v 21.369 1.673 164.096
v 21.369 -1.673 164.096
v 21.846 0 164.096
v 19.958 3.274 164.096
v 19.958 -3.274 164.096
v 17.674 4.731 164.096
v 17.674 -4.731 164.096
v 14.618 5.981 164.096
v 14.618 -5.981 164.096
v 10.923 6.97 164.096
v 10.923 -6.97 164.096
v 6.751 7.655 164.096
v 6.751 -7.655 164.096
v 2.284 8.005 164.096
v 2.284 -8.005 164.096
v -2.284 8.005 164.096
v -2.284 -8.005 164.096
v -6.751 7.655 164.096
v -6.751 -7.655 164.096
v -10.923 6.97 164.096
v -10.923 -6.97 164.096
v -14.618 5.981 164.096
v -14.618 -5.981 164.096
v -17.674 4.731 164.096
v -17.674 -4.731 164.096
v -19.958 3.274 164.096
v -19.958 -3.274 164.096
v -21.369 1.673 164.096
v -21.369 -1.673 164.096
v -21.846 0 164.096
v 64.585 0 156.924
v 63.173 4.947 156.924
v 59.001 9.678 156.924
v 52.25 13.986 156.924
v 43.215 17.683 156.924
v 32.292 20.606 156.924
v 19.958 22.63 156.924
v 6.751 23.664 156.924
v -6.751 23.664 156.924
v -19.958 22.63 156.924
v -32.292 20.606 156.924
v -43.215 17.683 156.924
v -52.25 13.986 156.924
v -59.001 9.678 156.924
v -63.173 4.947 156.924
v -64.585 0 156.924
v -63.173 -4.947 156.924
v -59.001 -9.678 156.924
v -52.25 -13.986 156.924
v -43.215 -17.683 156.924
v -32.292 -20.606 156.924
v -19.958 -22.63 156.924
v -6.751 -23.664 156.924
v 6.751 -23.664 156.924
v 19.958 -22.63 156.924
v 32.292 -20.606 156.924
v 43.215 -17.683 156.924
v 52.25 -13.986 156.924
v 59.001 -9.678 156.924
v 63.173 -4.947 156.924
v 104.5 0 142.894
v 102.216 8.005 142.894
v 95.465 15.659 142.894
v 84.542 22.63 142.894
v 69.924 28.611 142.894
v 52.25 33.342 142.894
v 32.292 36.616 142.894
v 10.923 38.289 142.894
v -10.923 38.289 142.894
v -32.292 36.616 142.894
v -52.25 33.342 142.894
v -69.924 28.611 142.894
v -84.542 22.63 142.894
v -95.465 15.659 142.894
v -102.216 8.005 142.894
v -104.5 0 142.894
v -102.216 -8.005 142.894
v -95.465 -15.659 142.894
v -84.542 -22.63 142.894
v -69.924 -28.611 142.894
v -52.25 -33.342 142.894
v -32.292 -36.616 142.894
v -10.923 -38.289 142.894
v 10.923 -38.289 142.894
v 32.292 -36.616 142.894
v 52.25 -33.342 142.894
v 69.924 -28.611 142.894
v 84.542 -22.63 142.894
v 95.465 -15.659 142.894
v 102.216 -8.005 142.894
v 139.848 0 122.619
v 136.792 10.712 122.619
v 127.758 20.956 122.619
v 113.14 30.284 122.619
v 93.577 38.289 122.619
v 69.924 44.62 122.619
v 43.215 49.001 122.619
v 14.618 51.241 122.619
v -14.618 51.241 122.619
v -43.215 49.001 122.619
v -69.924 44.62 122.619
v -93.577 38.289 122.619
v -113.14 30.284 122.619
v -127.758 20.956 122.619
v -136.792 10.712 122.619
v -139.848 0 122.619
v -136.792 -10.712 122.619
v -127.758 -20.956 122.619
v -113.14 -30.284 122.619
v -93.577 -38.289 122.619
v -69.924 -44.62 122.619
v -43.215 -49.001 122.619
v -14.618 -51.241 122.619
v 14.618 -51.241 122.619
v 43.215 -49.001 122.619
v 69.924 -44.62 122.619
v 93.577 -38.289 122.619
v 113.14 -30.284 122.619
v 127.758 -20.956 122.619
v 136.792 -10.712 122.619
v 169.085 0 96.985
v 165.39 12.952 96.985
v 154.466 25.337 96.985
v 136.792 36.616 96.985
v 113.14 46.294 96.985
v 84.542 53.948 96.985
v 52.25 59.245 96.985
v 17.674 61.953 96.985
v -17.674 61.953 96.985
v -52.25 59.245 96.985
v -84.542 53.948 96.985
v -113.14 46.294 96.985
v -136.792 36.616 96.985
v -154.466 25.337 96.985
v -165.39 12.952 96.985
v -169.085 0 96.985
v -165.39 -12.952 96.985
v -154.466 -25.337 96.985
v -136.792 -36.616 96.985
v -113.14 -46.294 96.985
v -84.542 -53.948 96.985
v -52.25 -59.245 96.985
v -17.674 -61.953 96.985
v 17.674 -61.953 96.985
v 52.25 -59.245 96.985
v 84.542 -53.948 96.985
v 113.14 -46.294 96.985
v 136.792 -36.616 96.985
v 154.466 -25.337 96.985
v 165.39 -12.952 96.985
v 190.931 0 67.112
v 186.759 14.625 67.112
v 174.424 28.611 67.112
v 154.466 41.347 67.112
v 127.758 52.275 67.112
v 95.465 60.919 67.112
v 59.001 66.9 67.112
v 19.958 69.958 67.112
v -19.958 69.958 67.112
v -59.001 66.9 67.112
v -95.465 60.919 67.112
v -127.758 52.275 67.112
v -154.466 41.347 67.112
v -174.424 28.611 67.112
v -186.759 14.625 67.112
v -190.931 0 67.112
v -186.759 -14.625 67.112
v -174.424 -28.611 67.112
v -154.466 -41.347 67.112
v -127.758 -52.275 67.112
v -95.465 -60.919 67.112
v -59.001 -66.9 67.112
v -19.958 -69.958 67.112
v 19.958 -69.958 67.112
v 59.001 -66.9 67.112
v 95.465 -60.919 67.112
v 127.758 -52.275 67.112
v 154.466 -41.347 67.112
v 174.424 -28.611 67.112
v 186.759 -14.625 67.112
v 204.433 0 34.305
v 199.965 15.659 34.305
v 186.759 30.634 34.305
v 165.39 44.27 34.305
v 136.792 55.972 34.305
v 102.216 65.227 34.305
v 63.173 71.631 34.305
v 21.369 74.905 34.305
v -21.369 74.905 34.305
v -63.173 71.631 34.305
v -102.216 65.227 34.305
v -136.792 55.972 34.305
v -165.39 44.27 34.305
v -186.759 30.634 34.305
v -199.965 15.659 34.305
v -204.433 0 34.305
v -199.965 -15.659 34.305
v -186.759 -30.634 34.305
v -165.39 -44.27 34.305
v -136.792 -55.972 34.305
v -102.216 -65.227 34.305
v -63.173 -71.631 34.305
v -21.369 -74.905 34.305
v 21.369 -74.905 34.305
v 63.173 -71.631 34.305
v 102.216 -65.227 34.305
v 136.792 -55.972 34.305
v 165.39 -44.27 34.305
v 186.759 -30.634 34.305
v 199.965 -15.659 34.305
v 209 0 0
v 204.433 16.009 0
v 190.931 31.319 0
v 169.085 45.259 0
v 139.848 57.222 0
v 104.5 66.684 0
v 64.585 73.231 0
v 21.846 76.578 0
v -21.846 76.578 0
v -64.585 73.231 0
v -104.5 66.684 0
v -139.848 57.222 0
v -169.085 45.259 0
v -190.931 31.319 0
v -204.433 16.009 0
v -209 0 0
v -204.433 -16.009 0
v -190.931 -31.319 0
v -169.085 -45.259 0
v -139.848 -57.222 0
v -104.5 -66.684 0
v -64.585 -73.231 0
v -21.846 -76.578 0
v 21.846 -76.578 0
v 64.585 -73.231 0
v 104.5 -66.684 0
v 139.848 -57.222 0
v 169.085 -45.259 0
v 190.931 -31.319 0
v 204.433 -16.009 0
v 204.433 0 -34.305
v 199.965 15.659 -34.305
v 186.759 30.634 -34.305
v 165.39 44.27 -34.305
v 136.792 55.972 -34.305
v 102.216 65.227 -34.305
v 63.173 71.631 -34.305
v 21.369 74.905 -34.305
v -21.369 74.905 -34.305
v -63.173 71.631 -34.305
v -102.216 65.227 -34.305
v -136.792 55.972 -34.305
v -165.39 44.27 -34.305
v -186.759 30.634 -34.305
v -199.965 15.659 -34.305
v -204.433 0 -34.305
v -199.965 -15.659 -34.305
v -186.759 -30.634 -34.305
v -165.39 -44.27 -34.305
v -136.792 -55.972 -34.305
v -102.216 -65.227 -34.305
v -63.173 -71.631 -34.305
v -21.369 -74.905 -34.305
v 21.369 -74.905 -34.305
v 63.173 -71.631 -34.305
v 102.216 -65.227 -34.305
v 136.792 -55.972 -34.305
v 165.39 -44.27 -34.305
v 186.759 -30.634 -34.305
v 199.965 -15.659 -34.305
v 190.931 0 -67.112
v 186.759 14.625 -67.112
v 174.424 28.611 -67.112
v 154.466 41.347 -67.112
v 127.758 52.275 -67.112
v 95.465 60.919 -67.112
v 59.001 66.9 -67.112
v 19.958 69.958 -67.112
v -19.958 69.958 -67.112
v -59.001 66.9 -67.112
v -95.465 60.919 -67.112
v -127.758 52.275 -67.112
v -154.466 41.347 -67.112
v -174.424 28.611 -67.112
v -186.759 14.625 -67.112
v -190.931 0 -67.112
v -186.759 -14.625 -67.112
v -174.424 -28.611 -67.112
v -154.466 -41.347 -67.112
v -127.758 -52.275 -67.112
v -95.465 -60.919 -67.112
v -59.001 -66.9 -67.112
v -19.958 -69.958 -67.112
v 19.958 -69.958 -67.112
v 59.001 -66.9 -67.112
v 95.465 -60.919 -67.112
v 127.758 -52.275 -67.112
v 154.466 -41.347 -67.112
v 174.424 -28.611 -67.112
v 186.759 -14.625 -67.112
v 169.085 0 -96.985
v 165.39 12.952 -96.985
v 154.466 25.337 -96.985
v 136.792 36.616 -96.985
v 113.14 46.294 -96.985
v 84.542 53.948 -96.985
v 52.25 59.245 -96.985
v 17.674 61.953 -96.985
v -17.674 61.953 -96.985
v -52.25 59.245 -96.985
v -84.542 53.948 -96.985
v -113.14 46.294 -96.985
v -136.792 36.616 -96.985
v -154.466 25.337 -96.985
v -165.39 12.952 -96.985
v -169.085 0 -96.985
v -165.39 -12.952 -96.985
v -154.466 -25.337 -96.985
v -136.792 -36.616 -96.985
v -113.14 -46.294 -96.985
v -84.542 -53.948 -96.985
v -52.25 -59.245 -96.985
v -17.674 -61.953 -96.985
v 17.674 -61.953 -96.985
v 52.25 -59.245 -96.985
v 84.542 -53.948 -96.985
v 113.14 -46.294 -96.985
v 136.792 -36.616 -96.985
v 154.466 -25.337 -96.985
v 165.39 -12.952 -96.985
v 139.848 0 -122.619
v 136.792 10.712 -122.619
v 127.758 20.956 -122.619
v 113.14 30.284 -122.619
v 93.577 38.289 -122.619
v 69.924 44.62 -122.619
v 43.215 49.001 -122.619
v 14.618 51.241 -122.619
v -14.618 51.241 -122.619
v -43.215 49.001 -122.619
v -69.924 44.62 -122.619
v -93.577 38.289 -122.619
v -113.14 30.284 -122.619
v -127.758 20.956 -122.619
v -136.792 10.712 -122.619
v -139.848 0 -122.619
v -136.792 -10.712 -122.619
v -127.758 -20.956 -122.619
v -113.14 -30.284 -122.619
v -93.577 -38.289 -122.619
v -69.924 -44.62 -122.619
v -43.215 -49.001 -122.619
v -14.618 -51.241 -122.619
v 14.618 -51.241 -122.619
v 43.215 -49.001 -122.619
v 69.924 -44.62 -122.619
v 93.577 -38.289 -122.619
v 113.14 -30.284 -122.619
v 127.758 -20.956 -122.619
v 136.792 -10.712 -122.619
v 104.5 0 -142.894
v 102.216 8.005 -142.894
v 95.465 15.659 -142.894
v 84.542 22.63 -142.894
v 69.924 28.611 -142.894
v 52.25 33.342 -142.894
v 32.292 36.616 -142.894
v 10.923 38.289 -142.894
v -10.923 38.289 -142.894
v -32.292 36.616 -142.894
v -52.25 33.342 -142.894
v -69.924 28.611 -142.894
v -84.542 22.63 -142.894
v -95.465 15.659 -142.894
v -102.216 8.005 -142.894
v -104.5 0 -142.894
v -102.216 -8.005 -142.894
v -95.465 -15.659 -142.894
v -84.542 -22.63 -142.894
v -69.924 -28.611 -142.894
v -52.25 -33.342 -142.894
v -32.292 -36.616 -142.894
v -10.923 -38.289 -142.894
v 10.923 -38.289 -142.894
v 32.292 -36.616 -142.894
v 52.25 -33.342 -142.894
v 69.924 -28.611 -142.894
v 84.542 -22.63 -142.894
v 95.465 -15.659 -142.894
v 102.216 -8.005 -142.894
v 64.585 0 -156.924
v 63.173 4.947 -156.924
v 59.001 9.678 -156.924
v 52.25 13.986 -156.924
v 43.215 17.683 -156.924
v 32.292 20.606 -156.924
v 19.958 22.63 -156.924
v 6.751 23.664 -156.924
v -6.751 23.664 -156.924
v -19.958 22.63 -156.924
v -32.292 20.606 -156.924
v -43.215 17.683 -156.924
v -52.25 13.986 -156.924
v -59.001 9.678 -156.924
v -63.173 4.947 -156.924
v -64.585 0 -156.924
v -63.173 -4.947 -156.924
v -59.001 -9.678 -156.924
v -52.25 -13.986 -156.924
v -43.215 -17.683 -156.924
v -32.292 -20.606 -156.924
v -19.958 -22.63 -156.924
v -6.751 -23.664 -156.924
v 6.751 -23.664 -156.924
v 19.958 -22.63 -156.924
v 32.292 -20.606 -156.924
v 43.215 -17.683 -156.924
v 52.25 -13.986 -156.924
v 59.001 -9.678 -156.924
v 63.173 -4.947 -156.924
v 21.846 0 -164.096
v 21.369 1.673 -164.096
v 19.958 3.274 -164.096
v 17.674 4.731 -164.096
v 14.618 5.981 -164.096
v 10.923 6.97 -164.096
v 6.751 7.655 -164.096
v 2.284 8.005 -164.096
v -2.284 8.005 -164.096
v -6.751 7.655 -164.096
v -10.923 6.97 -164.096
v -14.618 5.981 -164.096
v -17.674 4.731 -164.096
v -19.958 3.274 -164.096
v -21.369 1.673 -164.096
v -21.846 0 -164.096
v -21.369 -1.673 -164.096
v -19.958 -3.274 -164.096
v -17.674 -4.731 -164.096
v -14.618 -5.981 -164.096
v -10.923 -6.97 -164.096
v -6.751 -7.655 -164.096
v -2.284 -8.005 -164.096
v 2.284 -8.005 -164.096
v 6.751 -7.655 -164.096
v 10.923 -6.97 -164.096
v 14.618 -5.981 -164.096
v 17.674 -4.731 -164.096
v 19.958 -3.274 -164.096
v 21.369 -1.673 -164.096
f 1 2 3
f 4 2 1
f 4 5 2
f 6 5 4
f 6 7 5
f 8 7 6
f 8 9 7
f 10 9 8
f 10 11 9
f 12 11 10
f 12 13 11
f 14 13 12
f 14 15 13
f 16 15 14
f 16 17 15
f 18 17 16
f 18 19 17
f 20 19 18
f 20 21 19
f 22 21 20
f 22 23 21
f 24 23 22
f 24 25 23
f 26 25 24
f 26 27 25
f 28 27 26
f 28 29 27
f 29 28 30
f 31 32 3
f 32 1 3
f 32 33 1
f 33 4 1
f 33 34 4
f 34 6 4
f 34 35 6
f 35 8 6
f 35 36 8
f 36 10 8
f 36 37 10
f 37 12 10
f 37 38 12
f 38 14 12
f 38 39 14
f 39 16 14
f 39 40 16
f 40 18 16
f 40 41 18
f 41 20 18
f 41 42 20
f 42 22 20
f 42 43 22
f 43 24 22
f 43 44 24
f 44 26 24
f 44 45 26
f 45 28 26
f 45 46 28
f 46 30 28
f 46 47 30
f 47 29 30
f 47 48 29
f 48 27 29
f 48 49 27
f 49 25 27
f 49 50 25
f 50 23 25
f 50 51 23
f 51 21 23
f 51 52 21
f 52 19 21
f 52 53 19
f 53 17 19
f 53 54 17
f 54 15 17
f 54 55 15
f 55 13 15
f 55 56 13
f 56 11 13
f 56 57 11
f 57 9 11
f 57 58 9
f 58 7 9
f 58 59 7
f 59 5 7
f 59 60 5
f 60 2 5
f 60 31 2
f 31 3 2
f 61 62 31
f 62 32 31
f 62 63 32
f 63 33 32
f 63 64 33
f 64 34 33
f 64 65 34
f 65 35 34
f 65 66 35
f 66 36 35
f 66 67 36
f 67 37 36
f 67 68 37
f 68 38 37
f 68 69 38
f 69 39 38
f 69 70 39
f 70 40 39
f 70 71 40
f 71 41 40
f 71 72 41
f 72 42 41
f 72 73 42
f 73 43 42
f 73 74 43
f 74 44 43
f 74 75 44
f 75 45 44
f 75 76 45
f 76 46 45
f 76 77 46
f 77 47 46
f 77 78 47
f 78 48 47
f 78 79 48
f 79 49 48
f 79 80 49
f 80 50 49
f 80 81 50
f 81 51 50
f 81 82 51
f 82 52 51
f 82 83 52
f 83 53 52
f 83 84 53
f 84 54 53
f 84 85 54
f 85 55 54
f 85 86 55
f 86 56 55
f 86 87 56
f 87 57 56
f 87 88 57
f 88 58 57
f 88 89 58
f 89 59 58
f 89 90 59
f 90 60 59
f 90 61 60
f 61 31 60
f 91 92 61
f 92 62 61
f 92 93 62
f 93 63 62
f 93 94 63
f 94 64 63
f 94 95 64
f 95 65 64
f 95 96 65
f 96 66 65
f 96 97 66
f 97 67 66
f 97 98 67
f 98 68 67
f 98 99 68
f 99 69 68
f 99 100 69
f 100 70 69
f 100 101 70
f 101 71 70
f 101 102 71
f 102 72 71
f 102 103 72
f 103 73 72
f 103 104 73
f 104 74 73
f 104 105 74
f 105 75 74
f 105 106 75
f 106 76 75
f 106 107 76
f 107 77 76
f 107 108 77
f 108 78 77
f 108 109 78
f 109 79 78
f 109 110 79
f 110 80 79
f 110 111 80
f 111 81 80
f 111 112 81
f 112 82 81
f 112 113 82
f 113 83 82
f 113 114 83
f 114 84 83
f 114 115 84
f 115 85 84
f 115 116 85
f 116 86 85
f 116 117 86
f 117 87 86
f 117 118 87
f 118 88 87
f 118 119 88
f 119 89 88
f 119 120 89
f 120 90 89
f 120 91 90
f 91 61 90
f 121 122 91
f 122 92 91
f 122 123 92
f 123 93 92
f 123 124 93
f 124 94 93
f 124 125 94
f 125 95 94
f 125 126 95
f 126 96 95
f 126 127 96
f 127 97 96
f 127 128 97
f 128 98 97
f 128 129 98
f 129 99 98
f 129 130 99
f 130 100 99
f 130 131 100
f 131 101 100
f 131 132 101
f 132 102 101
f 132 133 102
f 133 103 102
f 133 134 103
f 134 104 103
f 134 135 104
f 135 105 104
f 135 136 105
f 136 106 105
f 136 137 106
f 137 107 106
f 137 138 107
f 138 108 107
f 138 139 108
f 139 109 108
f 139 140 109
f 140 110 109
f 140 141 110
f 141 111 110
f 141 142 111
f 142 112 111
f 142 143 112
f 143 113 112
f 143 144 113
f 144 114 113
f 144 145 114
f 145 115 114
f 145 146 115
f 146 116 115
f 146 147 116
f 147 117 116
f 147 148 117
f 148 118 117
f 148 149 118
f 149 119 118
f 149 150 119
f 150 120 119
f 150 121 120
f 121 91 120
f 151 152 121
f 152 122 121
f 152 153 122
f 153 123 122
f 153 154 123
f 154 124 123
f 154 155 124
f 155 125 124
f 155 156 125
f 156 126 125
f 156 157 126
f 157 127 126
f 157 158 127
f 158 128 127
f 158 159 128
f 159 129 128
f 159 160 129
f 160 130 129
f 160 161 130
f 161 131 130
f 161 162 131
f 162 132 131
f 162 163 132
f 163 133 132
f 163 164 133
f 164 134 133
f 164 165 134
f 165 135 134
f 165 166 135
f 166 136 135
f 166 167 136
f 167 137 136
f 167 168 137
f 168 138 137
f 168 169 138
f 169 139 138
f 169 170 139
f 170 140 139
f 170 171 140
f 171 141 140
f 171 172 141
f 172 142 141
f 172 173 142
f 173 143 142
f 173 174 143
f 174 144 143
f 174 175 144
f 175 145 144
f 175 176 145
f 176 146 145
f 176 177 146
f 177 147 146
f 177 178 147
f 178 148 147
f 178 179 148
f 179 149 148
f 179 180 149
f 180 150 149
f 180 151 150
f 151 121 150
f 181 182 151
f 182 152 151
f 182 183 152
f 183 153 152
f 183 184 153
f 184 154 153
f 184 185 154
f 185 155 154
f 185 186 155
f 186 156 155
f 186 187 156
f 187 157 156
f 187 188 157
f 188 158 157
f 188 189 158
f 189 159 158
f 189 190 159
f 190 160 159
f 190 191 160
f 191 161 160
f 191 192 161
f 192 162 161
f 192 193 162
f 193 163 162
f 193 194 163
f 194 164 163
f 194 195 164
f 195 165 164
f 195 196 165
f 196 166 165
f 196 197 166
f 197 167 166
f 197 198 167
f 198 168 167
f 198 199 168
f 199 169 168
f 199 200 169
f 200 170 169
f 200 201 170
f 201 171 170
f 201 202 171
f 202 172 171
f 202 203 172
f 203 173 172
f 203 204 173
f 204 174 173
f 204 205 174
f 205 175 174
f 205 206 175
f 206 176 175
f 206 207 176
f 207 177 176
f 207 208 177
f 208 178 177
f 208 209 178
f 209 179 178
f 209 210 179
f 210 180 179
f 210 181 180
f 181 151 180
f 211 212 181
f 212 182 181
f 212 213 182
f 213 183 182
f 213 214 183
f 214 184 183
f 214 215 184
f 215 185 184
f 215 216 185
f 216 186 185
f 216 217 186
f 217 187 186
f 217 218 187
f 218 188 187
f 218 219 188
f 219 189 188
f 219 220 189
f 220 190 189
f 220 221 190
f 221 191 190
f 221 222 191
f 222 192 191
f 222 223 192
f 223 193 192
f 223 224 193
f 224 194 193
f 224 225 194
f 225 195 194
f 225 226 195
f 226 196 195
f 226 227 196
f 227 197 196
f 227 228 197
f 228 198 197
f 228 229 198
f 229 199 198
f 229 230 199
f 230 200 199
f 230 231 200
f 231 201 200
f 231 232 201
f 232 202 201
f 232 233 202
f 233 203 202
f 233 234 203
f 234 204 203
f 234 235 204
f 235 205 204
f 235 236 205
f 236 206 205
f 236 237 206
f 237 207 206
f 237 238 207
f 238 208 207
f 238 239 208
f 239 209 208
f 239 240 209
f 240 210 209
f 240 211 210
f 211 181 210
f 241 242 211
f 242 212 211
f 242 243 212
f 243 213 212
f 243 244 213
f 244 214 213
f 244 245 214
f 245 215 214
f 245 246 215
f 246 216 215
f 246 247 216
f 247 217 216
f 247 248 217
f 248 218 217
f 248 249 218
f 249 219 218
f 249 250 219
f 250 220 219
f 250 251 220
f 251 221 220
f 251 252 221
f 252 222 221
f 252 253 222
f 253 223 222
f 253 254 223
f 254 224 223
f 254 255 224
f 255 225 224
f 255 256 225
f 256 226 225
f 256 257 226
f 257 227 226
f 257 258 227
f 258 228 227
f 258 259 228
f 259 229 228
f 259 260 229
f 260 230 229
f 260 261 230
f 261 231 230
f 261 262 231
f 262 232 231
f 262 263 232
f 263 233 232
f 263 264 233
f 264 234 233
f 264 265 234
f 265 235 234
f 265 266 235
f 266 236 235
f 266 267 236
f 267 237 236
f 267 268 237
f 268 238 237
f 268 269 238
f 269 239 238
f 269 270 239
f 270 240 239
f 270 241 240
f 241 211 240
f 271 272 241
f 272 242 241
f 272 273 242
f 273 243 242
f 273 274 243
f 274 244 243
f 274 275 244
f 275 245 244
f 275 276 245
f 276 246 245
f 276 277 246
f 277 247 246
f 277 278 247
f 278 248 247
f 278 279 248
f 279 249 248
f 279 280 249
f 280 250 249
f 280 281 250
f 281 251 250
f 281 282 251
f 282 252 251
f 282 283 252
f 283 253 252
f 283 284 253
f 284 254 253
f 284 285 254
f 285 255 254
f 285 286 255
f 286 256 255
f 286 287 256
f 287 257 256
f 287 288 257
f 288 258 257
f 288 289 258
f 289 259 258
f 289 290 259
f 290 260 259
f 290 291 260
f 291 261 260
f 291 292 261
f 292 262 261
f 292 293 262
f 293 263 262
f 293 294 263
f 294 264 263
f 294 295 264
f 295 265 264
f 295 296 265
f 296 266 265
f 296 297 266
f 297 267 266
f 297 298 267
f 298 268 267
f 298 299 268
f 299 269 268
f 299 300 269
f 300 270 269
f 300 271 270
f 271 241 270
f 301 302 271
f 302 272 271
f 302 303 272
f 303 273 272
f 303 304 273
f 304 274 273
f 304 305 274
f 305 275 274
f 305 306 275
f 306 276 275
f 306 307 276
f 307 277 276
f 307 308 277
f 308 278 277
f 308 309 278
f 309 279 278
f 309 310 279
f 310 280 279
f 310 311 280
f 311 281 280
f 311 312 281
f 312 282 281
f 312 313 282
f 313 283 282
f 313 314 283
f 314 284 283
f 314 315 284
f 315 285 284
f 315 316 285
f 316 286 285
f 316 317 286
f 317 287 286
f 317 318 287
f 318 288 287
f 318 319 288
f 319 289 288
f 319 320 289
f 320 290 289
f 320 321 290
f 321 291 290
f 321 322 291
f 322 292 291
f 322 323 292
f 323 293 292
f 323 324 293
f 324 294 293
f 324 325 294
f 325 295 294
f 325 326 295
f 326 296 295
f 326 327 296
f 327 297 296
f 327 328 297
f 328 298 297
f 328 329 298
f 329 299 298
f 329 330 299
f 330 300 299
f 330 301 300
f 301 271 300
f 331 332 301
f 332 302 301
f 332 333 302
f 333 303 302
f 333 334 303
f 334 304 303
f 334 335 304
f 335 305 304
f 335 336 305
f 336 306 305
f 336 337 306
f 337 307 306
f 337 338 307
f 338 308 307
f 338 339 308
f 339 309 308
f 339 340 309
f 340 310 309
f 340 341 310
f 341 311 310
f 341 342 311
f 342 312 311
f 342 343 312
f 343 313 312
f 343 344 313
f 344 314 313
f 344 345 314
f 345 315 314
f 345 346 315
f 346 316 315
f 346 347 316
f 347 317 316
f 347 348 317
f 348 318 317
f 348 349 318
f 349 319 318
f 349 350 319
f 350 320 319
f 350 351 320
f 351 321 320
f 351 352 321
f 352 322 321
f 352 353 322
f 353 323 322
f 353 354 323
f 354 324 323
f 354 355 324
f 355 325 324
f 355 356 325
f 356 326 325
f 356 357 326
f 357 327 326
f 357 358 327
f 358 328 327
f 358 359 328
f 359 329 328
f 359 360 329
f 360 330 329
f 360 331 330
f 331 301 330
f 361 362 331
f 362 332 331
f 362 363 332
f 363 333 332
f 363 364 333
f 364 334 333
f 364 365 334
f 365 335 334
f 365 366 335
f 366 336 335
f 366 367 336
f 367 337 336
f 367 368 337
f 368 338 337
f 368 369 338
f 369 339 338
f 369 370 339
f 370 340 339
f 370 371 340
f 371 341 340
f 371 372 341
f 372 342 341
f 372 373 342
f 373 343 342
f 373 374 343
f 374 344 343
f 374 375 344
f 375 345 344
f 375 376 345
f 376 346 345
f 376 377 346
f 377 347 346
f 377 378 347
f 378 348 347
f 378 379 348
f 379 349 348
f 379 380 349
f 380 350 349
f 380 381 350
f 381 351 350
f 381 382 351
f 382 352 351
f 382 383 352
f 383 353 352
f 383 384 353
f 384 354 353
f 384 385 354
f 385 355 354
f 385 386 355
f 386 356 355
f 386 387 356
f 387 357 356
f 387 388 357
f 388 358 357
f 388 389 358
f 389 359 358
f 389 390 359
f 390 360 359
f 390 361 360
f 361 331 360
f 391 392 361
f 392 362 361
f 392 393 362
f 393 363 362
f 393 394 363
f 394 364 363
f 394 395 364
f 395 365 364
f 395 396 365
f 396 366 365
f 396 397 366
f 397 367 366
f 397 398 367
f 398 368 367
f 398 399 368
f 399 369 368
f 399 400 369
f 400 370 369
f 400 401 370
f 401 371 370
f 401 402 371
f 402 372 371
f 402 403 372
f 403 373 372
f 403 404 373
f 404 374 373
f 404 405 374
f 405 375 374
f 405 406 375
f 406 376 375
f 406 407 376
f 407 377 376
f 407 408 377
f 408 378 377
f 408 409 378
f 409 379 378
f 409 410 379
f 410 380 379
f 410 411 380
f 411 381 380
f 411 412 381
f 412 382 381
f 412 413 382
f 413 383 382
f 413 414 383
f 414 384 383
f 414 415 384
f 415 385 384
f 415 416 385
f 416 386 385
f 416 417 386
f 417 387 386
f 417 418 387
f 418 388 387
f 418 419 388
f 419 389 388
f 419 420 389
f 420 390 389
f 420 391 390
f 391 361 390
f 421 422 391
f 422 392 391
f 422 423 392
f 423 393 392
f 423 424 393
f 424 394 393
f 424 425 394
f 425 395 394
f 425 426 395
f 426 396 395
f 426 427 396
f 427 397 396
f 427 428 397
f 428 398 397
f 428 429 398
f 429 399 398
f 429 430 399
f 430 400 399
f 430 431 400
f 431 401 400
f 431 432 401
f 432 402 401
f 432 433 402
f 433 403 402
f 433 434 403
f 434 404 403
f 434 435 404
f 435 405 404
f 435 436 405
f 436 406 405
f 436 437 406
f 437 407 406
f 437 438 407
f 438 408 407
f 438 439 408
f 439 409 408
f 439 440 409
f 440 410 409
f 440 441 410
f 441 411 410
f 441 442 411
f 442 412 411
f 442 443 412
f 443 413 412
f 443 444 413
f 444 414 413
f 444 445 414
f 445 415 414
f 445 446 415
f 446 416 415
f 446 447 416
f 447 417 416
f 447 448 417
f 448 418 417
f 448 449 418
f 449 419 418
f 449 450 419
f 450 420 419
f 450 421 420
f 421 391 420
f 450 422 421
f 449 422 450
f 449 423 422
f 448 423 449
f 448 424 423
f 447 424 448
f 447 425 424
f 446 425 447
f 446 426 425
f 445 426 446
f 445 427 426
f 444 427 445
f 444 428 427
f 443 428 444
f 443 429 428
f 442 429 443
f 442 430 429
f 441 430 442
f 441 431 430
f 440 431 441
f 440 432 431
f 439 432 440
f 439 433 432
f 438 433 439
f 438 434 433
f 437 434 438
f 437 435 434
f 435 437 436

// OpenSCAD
// Generated by SolidPython 1.0.1 on 2020-07-29 00:46:53


scale(v = [19, 7, 15]) {
	sphere(r = 11);
}
/***********************************************
*********      SolidPython code:      **********
************************************************
 
# import packages: SolidPython
from solid import *
from solid.utils import *
from itertools import chain, combinations, permutations


class Resize:

    def __init__(self, scad_file):
        self.scad_file = scad_file
        #self.scad_file = import_scad(scad_file)
        # cone/cylinder param:
        self.r1 = 0
        self.r2 = 0
        self.h = 0
        # rectangular prism param:
        self.w = 0
        self.l = 0
        # ellipse param:
        self.r = 0

    # import OpenScad code (file name corresponds to shape)


    # classify shape + parameters
    def assign(self, param1, param2, param3):
        if self.scad_file == 'cone.scad':
            self.r1 = param1
            self.r2 = param2
            self.h = param3
        elif self.scad_file == 'cylinder.scad':
            self.r1 = param1
            self.r2 = param2
            self.h = param3
        elif self.scad_file == 'rectangularPrism.scad':
            self.h = param1
            self.l = param2
            self.w = param3
        else:
            self.r = param1
            self.h = param2

    # resize parameters
    def iterate(self):
        x = range(3, 20, 2)
        i = 1
        if self.scad_file == 'cone.scad':
            tempList = list(permutations(x, 2))
            for temp in tempList:
                param1 = temp[0]
                param2 = temp[1]
                filepath = 'produced_scad_files/' + 'cone' + str(param1) + '_' + str(param2) + '_' + '.scad'
                scad_render_to_file(cylinder(h=param1, r1=param2, r2=0), filepath)

        elif self.scad_file == 'cylinder.scad':
            tempList = list(permutations(x, 3))
            for temp in tempList:
                param1 = temp[0]
                param2 = temp[1]
                filepath = 'produced_scad_files/' + 'cylinder' + str(param1) + '_' + str(param2) + '_' + '.scad'
                scad_render_to_file(cylinder(h=param1, r1=param2, r2=param2), filepath)

        elif self.scad_file == 'rectangularPrism.scad':
            tempList = list(permutations(x, 3))
            for temp in tempList:
                param1 = temp[0]
                param2 = temp[1]
                param3 = temp[2]
                filepath = 'produced_scad_files/' + 'rectangularPrism' + str(param1) + '_' + str(param2) + '_' + str(
                    param3) + '.scad'
                scad_render_to_file(cube(size=(param1, param2, param3)), filepath)

        elif self.scad_file == 'ellipse.scad':
            tempList = list(permutations(x, 4))
            for temp in tempList:
                param1 = temp[0]
                param2 = temp[1]
                param3 = temp[2]
                param4 = temp[3]
                filepath = 'produced_scad_files/' + 'ellipse' + str(param1) + '_' + str(param2) + '_' + str(param3) + '_' + str(param4) + '.scad'
                scad_render_to_file(scale([param1, param2, param3])(sphere(r=param4)), filepath)

    def render_to_scadfile(self):
        scad_render_to_file(scad, 'example.scad') 
 
************************************************/
